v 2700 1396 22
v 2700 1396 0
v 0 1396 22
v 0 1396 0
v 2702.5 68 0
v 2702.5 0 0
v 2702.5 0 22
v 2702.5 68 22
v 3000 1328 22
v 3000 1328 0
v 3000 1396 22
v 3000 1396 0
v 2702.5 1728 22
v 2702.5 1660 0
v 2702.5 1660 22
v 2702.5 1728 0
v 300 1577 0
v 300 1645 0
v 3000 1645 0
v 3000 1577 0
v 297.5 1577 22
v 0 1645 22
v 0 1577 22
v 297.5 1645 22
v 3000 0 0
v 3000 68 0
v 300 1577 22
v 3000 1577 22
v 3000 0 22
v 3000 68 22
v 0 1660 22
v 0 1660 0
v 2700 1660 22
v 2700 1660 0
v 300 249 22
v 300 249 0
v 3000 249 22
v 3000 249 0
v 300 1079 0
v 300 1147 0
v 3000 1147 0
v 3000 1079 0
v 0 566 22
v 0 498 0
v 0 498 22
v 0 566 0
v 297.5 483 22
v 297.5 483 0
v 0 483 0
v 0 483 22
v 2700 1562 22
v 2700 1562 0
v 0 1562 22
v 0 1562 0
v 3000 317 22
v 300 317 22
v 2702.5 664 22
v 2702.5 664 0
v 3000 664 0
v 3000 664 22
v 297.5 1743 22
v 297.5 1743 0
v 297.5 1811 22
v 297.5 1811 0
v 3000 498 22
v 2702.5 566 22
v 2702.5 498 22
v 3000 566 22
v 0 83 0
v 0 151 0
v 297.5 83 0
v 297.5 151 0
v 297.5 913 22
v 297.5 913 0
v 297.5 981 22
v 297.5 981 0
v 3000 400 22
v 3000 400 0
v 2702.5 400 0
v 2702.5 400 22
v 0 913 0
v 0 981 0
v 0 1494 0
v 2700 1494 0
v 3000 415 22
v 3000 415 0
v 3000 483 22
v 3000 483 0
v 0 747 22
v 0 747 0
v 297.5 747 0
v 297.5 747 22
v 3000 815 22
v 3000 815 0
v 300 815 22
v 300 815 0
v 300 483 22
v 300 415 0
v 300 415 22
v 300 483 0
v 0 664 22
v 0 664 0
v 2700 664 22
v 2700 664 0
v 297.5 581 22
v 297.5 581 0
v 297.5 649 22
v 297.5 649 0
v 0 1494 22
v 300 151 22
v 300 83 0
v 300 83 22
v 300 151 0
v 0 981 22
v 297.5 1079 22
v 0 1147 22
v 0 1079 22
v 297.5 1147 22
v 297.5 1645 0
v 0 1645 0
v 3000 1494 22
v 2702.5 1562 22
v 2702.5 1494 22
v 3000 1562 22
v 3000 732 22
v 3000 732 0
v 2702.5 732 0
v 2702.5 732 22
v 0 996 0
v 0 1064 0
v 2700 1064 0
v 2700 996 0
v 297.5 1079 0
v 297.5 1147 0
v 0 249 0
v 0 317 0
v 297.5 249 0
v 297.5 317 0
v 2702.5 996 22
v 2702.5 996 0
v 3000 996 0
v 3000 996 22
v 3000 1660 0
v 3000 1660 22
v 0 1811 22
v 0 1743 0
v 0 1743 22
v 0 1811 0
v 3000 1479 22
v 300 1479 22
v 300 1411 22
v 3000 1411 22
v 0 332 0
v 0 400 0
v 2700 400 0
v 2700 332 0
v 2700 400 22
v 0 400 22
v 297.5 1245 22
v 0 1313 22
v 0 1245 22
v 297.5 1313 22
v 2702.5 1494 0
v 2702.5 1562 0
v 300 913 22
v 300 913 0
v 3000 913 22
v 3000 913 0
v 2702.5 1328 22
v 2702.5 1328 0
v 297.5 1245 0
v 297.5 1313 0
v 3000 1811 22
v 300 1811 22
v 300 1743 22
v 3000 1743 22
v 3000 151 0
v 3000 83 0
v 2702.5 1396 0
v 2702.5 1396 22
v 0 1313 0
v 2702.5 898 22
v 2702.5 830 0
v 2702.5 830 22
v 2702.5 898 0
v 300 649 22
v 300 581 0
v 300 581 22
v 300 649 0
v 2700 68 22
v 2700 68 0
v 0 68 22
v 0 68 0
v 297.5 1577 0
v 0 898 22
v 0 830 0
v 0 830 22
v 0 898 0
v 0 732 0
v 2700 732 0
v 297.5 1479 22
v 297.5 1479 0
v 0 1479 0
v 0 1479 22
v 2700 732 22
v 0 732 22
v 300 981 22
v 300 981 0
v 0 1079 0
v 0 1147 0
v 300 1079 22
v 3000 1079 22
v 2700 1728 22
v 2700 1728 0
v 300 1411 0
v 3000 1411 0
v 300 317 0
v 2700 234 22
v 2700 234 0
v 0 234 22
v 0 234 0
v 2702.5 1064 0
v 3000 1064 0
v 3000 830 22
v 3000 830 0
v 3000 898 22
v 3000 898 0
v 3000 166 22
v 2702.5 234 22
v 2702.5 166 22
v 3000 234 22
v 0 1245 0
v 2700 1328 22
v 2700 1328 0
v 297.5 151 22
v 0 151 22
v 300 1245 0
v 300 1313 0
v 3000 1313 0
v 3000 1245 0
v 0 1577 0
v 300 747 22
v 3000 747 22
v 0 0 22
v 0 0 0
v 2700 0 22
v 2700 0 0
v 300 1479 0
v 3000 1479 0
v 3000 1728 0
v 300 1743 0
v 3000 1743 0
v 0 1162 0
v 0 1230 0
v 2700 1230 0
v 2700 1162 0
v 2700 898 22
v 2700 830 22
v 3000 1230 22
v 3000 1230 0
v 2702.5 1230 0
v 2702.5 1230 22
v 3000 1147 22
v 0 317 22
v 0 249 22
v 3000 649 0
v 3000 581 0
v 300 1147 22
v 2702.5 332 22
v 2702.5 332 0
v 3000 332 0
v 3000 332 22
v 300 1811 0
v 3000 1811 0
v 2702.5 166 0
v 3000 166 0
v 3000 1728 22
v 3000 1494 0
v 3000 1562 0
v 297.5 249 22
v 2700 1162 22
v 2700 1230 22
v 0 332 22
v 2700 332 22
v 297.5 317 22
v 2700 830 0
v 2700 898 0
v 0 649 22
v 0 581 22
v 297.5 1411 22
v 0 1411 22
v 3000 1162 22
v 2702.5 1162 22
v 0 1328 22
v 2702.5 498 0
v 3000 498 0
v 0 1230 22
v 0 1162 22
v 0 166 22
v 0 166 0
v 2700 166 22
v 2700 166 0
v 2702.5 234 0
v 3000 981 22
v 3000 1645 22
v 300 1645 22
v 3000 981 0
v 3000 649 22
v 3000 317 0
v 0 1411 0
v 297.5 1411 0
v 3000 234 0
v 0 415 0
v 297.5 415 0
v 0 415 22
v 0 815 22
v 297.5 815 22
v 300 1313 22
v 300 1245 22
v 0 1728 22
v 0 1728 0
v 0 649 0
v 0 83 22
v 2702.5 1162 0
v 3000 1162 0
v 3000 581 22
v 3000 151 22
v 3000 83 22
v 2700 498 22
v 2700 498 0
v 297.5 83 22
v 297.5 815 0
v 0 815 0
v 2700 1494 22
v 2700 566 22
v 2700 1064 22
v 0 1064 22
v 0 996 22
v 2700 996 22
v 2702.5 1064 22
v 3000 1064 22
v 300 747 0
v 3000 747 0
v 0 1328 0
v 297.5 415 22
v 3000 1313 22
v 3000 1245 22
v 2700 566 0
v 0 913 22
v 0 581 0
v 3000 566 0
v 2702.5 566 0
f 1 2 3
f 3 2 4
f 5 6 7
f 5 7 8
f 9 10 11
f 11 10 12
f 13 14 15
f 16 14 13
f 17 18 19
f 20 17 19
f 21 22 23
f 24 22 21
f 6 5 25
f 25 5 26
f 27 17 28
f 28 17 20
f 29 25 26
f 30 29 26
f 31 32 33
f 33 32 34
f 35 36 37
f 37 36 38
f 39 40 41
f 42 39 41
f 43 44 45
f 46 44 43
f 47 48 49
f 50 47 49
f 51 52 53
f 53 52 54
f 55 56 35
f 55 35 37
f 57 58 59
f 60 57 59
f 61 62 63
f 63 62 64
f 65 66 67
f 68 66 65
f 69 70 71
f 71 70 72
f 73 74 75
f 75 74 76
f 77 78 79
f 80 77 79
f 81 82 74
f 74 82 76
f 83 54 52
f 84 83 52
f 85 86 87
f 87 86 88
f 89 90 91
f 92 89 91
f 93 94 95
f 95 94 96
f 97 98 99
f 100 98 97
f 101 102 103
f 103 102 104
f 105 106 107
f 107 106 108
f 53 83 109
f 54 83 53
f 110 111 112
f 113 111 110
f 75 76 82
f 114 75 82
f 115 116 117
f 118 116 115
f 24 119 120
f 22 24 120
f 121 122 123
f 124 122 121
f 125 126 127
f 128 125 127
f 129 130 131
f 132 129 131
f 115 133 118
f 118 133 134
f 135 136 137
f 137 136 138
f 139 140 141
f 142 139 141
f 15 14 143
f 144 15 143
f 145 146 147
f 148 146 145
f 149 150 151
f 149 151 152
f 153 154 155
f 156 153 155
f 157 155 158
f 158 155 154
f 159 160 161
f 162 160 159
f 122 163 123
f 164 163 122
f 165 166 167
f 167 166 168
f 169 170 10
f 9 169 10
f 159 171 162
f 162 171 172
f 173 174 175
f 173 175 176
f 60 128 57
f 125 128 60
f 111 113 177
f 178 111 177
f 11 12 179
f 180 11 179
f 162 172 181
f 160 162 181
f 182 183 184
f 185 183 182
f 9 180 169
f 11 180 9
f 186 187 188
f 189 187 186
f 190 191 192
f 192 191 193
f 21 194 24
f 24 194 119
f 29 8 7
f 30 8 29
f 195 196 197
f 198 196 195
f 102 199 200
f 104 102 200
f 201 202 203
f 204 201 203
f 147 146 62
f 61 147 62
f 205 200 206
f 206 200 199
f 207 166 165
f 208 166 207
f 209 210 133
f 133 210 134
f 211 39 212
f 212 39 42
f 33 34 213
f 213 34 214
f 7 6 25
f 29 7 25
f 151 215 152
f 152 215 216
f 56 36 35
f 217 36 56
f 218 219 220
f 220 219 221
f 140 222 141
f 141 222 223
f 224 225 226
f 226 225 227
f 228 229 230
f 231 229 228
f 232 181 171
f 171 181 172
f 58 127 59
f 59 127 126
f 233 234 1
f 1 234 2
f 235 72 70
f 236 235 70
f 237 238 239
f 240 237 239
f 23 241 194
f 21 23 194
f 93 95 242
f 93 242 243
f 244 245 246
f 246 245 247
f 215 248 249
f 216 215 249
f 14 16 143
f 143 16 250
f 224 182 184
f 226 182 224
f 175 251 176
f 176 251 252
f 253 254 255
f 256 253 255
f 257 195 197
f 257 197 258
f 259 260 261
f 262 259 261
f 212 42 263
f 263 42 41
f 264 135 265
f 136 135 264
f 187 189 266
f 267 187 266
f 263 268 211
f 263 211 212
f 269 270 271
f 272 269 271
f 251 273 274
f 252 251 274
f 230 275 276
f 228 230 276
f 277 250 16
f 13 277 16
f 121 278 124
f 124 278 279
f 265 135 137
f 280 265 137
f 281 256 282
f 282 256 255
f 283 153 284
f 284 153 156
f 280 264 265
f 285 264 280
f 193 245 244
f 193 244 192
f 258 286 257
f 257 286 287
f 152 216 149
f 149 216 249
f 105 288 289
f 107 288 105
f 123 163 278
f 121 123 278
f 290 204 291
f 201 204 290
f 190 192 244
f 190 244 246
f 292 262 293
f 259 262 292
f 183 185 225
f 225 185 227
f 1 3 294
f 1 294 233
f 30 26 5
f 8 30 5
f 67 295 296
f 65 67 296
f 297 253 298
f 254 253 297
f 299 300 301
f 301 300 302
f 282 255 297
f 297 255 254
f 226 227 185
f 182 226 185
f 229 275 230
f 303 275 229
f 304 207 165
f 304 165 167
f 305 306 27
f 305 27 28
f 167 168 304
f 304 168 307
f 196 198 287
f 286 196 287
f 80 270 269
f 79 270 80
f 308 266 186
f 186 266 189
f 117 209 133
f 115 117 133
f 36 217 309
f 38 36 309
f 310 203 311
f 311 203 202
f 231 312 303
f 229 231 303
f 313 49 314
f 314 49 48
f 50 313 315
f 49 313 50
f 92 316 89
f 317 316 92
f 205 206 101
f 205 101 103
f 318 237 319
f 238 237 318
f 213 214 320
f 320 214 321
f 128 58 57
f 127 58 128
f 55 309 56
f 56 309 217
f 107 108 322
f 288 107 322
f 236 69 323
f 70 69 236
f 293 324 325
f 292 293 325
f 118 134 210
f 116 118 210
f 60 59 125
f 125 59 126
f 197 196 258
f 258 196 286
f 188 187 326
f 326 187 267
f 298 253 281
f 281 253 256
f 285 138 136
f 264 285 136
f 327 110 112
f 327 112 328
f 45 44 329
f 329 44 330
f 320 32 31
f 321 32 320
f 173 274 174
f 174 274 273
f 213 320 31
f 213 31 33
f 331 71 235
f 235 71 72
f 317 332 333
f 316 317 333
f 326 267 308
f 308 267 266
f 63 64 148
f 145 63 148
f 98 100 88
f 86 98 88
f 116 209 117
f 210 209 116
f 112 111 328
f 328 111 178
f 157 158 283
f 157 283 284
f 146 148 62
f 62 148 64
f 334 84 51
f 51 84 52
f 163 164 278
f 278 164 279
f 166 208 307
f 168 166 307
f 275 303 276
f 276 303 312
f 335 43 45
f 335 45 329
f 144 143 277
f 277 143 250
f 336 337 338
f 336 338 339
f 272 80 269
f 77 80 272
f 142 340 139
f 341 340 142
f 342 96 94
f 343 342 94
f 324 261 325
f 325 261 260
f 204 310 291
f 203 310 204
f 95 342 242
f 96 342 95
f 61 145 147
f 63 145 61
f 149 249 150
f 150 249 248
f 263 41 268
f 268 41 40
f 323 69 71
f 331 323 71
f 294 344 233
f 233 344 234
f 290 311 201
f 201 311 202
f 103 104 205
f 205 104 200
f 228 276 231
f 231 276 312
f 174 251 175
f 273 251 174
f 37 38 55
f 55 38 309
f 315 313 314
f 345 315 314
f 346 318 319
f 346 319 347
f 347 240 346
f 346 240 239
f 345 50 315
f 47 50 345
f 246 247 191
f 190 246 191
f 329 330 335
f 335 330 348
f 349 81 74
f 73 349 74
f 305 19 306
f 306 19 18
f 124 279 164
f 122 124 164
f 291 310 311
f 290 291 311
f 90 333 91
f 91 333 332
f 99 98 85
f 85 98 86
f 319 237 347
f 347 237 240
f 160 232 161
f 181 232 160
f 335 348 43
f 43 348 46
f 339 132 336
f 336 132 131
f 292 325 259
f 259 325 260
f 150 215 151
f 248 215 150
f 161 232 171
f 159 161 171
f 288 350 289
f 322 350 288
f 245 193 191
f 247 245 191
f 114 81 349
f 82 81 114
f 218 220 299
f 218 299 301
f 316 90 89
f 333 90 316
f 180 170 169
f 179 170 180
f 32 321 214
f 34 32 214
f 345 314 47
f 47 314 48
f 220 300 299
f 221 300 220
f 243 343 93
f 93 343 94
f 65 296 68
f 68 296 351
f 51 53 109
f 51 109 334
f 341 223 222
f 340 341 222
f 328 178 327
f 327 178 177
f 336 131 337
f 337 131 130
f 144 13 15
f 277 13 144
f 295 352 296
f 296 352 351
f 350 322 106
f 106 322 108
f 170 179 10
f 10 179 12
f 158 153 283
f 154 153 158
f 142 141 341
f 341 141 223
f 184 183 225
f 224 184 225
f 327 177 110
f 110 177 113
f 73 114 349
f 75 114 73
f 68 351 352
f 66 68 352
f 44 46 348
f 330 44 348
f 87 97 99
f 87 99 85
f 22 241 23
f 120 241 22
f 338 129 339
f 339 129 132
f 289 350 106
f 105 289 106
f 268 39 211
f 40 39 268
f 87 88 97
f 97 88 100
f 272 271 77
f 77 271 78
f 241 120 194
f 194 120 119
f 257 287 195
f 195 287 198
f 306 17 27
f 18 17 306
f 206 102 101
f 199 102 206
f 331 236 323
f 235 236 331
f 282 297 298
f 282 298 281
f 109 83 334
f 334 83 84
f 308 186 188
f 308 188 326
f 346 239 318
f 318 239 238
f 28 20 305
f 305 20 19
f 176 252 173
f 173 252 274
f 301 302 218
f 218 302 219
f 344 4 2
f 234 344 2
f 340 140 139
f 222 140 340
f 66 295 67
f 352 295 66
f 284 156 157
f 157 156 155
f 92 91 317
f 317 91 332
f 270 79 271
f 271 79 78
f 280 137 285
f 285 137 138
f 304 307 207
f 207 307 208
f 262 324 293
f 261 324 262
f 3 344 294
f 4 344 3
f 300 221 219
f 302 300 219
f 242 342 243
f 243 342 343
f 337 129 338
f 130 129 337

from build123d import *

# Parameters (mm, degrees)
F0_W     = 2700
F0_H     = 68
F0_W_2   = 2.5
F0_W_3   = 297.5
F1_DEPTH = 22
F2_DEPTH = 25


with BuildPart() as f1:
    # F0 (on Top) → F1 (new body)
    with BuildSketch(Plane.XY):
        with Locations((1350, 34)):
            Rectangle(F0_W, F0_H)
        with Locations((2701.25, 34)):
            Rectangle(F0_W_2, F0_H)
        with Locations((2851.25, 34)):
            Rectangle(F0_W_3, F0_H)
        with Locations((148.75, 117)):
            Rectangle(F0_W_3, F0_H)
        with Locations((298.75, 117)):
            Rectangle(F0_W_2, F0_H)
        with Locations((1650, 117)):
            Rectangle(F0_W, F0_H)
        with Locations((148.75, 283)):
            Rectangle(F0_W_3, F0_H)
        with Locations((298.75, 283)):
            Rectangle(F0_W_2, F0_H)
        with Locations((1650, 283)):
            Rectangle(F0_W, F0_H)
        with Locations((1350, 200)):
            Rectangle(F0_W, F0_H)
        with Locations((2701.25, 200)):
            Rectangle(F0_W_2, F0_H)
        with Locations((2851.25, 200)):
            Rectangle(F0_W_3, F0_H)
        with Locations((148.75, 449)):
            Rectangle(F0_W_3, F0_H)
        with Locations((298.75, 449)):
            Rectangle(F0_W_2, F0_H)
        with Locations((1650, 449)):
            Rectangle(F0_W, F0_H)
        with Locations((1350, 366)):
            Rectangle(F0_W, F0_H)
        with Locations((2701.25, 366)):
            Rectangle(F0_W_2, F0_H)
        with Locations((2851.25, 366)):
            Rectangle(F0_W_3, F0_H)
        with Locations((148.75, 615)):
            Rectangle(F0_W_3, F0_H)
        with Locations((298.75, 615)):
            Rectangle(F0_W_2, F0_H)
        with Locations((1650, 615)):
            Rectangle(F0_W, F0_H)
        with Locations((1350, 532)):
            Rectangle(F0_W, F0_H)
        with Locations((2701.25, 532)):
            Rectangle(F0_W_2, F0_H)
        with Locations((2851.25, 532)):
            Rectangle(F0_W_3, F0_H)
        with Locations((148.75, 781)):
            Rectangle(F0_W_3, F0_H)
        with Locations((298.75, 781)):
            Rectangle(F0_W_2, F0_H)
        with Locations((1650, 781)):
            Rectangle(F0_W, F0_H)
        with Locations((1350, 698)):
            Rectangle(F0_W, F0_H)
        with Locations((2701.25, 698)):
            Rectangle(F0_W_2, F0_H)
        with Locations((2851.25, 698)):
            Rectangle(F0_W_3, F0_H)
        with Locations((148.75, 947)):
            Rectangle(F0_W_3, F0_H)
        with Locations((298.75, 947)):
            Rectangle(F0_W_2, F0_H)
        with Locations((1650, 947)):
            Rectangle(F0_W, F0_H)
        with Locations((1350, 864)):
            Rectangle(F0_W, F0_H)
        with Locations((2701.25, 864)):
            Rectangle(F0_W_2, F0_H)
        with Locations((2851.25, 864)):
            Rectangle(F0_W_3, F0_H)
        with Locations((148.75, 1113)):
            Rectangle(F0_W_3, F0_H)
        with Locations((298.75, 1113)):
            Rectangle(F0_W_2, F0_H)
        with Locations((1650, 1113)):
            Rectangle(F0_W, F0_H)
        with Locations((1350, 1030)):
            Rectangle(F0_W, F0_H)
        with Locations((2701.25, 1030)):
            Rectangle(F0_W_2, F0_H)
        with Locations((2851.25, 1030)):
            Rectangle(F0_W_3, F0_H)
        with Locations((148.75, 1279)):
            Rectangle(F0_W_3, F0_H)
        with Locations((298.75, 1279)):
            Rectangle(F0_W_2, F0_H)
        with Locations((1650, 1279)):
            Rectangle(F0_W, F0_H)
        with Locations((1350, 1196)):
            Rectangle(F0_W, F0_H)
        with Locations((2701.25, 1196)):
            Rectangle(F0_W_2, F0_H)
        with Locations((2851.25, 1196)):
            Rectangle(F0_W_3, F0_H)
        with Locations((148.75, 1445)):
            Rectangle(F0_W_3, F0_H)
        with Locations((298.75, 1445)):
            Rectangle(F0_W_2, F0_H)
        with Locations((1650, 1445)):
            Rectangle(F0_W, F0_H)
        with Locations((1350, 1362)):
            Rectangle(F0_W, F0_H)
        with Locations((2701.25, 1362)):
            Rectangle(F0_W_2, F0_H)
        with Locations((2851.25, 1362)):
            Rectangle(F0_W_3, F0_H)
        with Locations((148.75, 1611)):
            Rectangle(F0_W_3, F0_H)
        with Locations((298.75, 1611)):
            Rectangle(F0_W_2, F0_H)
        with Locations((1650, 1611)):
            Rectangle(F0_W, F0_H)
        with Locations((1350, 1528)):
            Rectangle(F0_W, F0_H)
        with Locations((2701.25, 1528)):
            Rectangle(F0_W_2, F0_H)
        with Locations((2851.25, 1528)):
            Rectangle(F0_W_3, F0_H)
        with Locations((148.75, 1777)):
            Rectangle(F0_W_3, F0_H)
        with Locations((298.75, 1777)):
            Rectangle(F0_W_2, F0_H)
        with Locations((1650, 1777)):
            Rectangle(F0_W, F0_H)
        with Locations((1350, 1694)):
            Rectangle(F0_W, F0_H)
        with Locations((2701.25, 1694)):
            Rectangle(F0_W_2, F0_H)
        with Locations((2851.25, 1694)):
            Rectangle(F0_W_3, F0_H)
    extrude(amount=F1_DEPTH)

    # F0 (on Top) → F2 (cut)
    with BuildSketch(Plane.XY):
        with Locations((298.75, 117)):
            Rectangle(F0_W_2, F0_H)
        with Locations((298.75, 283)):
            Rectangle(F0_W_2, F0_H)
        with Locations((298.75, 449)):
            Rectangle(F0_W_2, F0_H)
        with Locations((298.75, 615)):
            Rectangle(F0_W_2, F0_H)
        with Locations((298.75, 781)):
            Rectangle(F0_W_2, F0_H)
        with Locations((298.75, 947)):
            Rectangle(F0_W_2, F0_H)
        with Locations((298.75, 1113)):
            Rectangle(F0_W_2, F0_H)
        with Locations((298.75, 1279)):
            Rectangle(F0_W_2, F0_H)
        with Locations((298.75, 1445)):
            Rectangle(F0_W_2, F0_H)
        with Locations((298.75, 1611)):
            Rectangle(F0_W_2, F0_H)
        with Locations((298.75, 1777)):
            Rectangle(F0_W_2, F0_H)
        with Locations((2701.25, 1694)):
            Rectangle(F0_W_2, F0_H)
        with Locations((2701.25, 1528)):
            Rectangle(F0_W_2, F0_H)
        with Locations((2701.25, 1362)):
            Rectangle(F0_W_2, F0_H)
        with Locations((2701.25, 1196)):
            Rectangle(F0_W_2, F0_H)
        with Locations((2701.25, 1030)):
            Rectangle(F0_W_2, F0_H)
        with Locations((2701.25, 864)):
            Rectangle(F0_W_2, F0_H)
        with Locations((2701.25, 698)):
            Rectangle(F0_W_2, F0_H)
        with Locations((2701.25, 532)):
            Rectangle(F0_W_2, F0_H)
        with Locations((2701.25, 366)):
            Rectangle(F0_W_2, F0_H)
        with Locations((2701.25, 200)):
            Rectangle(F0_W_2, F0_H)
        with Locations((2701.25, 34)):
            Rectangle(F0_W_2, F0_H)
    extrude(amount=F2_DEPTH, mode=Mode.SUBTRACT)


solid = f1.part
